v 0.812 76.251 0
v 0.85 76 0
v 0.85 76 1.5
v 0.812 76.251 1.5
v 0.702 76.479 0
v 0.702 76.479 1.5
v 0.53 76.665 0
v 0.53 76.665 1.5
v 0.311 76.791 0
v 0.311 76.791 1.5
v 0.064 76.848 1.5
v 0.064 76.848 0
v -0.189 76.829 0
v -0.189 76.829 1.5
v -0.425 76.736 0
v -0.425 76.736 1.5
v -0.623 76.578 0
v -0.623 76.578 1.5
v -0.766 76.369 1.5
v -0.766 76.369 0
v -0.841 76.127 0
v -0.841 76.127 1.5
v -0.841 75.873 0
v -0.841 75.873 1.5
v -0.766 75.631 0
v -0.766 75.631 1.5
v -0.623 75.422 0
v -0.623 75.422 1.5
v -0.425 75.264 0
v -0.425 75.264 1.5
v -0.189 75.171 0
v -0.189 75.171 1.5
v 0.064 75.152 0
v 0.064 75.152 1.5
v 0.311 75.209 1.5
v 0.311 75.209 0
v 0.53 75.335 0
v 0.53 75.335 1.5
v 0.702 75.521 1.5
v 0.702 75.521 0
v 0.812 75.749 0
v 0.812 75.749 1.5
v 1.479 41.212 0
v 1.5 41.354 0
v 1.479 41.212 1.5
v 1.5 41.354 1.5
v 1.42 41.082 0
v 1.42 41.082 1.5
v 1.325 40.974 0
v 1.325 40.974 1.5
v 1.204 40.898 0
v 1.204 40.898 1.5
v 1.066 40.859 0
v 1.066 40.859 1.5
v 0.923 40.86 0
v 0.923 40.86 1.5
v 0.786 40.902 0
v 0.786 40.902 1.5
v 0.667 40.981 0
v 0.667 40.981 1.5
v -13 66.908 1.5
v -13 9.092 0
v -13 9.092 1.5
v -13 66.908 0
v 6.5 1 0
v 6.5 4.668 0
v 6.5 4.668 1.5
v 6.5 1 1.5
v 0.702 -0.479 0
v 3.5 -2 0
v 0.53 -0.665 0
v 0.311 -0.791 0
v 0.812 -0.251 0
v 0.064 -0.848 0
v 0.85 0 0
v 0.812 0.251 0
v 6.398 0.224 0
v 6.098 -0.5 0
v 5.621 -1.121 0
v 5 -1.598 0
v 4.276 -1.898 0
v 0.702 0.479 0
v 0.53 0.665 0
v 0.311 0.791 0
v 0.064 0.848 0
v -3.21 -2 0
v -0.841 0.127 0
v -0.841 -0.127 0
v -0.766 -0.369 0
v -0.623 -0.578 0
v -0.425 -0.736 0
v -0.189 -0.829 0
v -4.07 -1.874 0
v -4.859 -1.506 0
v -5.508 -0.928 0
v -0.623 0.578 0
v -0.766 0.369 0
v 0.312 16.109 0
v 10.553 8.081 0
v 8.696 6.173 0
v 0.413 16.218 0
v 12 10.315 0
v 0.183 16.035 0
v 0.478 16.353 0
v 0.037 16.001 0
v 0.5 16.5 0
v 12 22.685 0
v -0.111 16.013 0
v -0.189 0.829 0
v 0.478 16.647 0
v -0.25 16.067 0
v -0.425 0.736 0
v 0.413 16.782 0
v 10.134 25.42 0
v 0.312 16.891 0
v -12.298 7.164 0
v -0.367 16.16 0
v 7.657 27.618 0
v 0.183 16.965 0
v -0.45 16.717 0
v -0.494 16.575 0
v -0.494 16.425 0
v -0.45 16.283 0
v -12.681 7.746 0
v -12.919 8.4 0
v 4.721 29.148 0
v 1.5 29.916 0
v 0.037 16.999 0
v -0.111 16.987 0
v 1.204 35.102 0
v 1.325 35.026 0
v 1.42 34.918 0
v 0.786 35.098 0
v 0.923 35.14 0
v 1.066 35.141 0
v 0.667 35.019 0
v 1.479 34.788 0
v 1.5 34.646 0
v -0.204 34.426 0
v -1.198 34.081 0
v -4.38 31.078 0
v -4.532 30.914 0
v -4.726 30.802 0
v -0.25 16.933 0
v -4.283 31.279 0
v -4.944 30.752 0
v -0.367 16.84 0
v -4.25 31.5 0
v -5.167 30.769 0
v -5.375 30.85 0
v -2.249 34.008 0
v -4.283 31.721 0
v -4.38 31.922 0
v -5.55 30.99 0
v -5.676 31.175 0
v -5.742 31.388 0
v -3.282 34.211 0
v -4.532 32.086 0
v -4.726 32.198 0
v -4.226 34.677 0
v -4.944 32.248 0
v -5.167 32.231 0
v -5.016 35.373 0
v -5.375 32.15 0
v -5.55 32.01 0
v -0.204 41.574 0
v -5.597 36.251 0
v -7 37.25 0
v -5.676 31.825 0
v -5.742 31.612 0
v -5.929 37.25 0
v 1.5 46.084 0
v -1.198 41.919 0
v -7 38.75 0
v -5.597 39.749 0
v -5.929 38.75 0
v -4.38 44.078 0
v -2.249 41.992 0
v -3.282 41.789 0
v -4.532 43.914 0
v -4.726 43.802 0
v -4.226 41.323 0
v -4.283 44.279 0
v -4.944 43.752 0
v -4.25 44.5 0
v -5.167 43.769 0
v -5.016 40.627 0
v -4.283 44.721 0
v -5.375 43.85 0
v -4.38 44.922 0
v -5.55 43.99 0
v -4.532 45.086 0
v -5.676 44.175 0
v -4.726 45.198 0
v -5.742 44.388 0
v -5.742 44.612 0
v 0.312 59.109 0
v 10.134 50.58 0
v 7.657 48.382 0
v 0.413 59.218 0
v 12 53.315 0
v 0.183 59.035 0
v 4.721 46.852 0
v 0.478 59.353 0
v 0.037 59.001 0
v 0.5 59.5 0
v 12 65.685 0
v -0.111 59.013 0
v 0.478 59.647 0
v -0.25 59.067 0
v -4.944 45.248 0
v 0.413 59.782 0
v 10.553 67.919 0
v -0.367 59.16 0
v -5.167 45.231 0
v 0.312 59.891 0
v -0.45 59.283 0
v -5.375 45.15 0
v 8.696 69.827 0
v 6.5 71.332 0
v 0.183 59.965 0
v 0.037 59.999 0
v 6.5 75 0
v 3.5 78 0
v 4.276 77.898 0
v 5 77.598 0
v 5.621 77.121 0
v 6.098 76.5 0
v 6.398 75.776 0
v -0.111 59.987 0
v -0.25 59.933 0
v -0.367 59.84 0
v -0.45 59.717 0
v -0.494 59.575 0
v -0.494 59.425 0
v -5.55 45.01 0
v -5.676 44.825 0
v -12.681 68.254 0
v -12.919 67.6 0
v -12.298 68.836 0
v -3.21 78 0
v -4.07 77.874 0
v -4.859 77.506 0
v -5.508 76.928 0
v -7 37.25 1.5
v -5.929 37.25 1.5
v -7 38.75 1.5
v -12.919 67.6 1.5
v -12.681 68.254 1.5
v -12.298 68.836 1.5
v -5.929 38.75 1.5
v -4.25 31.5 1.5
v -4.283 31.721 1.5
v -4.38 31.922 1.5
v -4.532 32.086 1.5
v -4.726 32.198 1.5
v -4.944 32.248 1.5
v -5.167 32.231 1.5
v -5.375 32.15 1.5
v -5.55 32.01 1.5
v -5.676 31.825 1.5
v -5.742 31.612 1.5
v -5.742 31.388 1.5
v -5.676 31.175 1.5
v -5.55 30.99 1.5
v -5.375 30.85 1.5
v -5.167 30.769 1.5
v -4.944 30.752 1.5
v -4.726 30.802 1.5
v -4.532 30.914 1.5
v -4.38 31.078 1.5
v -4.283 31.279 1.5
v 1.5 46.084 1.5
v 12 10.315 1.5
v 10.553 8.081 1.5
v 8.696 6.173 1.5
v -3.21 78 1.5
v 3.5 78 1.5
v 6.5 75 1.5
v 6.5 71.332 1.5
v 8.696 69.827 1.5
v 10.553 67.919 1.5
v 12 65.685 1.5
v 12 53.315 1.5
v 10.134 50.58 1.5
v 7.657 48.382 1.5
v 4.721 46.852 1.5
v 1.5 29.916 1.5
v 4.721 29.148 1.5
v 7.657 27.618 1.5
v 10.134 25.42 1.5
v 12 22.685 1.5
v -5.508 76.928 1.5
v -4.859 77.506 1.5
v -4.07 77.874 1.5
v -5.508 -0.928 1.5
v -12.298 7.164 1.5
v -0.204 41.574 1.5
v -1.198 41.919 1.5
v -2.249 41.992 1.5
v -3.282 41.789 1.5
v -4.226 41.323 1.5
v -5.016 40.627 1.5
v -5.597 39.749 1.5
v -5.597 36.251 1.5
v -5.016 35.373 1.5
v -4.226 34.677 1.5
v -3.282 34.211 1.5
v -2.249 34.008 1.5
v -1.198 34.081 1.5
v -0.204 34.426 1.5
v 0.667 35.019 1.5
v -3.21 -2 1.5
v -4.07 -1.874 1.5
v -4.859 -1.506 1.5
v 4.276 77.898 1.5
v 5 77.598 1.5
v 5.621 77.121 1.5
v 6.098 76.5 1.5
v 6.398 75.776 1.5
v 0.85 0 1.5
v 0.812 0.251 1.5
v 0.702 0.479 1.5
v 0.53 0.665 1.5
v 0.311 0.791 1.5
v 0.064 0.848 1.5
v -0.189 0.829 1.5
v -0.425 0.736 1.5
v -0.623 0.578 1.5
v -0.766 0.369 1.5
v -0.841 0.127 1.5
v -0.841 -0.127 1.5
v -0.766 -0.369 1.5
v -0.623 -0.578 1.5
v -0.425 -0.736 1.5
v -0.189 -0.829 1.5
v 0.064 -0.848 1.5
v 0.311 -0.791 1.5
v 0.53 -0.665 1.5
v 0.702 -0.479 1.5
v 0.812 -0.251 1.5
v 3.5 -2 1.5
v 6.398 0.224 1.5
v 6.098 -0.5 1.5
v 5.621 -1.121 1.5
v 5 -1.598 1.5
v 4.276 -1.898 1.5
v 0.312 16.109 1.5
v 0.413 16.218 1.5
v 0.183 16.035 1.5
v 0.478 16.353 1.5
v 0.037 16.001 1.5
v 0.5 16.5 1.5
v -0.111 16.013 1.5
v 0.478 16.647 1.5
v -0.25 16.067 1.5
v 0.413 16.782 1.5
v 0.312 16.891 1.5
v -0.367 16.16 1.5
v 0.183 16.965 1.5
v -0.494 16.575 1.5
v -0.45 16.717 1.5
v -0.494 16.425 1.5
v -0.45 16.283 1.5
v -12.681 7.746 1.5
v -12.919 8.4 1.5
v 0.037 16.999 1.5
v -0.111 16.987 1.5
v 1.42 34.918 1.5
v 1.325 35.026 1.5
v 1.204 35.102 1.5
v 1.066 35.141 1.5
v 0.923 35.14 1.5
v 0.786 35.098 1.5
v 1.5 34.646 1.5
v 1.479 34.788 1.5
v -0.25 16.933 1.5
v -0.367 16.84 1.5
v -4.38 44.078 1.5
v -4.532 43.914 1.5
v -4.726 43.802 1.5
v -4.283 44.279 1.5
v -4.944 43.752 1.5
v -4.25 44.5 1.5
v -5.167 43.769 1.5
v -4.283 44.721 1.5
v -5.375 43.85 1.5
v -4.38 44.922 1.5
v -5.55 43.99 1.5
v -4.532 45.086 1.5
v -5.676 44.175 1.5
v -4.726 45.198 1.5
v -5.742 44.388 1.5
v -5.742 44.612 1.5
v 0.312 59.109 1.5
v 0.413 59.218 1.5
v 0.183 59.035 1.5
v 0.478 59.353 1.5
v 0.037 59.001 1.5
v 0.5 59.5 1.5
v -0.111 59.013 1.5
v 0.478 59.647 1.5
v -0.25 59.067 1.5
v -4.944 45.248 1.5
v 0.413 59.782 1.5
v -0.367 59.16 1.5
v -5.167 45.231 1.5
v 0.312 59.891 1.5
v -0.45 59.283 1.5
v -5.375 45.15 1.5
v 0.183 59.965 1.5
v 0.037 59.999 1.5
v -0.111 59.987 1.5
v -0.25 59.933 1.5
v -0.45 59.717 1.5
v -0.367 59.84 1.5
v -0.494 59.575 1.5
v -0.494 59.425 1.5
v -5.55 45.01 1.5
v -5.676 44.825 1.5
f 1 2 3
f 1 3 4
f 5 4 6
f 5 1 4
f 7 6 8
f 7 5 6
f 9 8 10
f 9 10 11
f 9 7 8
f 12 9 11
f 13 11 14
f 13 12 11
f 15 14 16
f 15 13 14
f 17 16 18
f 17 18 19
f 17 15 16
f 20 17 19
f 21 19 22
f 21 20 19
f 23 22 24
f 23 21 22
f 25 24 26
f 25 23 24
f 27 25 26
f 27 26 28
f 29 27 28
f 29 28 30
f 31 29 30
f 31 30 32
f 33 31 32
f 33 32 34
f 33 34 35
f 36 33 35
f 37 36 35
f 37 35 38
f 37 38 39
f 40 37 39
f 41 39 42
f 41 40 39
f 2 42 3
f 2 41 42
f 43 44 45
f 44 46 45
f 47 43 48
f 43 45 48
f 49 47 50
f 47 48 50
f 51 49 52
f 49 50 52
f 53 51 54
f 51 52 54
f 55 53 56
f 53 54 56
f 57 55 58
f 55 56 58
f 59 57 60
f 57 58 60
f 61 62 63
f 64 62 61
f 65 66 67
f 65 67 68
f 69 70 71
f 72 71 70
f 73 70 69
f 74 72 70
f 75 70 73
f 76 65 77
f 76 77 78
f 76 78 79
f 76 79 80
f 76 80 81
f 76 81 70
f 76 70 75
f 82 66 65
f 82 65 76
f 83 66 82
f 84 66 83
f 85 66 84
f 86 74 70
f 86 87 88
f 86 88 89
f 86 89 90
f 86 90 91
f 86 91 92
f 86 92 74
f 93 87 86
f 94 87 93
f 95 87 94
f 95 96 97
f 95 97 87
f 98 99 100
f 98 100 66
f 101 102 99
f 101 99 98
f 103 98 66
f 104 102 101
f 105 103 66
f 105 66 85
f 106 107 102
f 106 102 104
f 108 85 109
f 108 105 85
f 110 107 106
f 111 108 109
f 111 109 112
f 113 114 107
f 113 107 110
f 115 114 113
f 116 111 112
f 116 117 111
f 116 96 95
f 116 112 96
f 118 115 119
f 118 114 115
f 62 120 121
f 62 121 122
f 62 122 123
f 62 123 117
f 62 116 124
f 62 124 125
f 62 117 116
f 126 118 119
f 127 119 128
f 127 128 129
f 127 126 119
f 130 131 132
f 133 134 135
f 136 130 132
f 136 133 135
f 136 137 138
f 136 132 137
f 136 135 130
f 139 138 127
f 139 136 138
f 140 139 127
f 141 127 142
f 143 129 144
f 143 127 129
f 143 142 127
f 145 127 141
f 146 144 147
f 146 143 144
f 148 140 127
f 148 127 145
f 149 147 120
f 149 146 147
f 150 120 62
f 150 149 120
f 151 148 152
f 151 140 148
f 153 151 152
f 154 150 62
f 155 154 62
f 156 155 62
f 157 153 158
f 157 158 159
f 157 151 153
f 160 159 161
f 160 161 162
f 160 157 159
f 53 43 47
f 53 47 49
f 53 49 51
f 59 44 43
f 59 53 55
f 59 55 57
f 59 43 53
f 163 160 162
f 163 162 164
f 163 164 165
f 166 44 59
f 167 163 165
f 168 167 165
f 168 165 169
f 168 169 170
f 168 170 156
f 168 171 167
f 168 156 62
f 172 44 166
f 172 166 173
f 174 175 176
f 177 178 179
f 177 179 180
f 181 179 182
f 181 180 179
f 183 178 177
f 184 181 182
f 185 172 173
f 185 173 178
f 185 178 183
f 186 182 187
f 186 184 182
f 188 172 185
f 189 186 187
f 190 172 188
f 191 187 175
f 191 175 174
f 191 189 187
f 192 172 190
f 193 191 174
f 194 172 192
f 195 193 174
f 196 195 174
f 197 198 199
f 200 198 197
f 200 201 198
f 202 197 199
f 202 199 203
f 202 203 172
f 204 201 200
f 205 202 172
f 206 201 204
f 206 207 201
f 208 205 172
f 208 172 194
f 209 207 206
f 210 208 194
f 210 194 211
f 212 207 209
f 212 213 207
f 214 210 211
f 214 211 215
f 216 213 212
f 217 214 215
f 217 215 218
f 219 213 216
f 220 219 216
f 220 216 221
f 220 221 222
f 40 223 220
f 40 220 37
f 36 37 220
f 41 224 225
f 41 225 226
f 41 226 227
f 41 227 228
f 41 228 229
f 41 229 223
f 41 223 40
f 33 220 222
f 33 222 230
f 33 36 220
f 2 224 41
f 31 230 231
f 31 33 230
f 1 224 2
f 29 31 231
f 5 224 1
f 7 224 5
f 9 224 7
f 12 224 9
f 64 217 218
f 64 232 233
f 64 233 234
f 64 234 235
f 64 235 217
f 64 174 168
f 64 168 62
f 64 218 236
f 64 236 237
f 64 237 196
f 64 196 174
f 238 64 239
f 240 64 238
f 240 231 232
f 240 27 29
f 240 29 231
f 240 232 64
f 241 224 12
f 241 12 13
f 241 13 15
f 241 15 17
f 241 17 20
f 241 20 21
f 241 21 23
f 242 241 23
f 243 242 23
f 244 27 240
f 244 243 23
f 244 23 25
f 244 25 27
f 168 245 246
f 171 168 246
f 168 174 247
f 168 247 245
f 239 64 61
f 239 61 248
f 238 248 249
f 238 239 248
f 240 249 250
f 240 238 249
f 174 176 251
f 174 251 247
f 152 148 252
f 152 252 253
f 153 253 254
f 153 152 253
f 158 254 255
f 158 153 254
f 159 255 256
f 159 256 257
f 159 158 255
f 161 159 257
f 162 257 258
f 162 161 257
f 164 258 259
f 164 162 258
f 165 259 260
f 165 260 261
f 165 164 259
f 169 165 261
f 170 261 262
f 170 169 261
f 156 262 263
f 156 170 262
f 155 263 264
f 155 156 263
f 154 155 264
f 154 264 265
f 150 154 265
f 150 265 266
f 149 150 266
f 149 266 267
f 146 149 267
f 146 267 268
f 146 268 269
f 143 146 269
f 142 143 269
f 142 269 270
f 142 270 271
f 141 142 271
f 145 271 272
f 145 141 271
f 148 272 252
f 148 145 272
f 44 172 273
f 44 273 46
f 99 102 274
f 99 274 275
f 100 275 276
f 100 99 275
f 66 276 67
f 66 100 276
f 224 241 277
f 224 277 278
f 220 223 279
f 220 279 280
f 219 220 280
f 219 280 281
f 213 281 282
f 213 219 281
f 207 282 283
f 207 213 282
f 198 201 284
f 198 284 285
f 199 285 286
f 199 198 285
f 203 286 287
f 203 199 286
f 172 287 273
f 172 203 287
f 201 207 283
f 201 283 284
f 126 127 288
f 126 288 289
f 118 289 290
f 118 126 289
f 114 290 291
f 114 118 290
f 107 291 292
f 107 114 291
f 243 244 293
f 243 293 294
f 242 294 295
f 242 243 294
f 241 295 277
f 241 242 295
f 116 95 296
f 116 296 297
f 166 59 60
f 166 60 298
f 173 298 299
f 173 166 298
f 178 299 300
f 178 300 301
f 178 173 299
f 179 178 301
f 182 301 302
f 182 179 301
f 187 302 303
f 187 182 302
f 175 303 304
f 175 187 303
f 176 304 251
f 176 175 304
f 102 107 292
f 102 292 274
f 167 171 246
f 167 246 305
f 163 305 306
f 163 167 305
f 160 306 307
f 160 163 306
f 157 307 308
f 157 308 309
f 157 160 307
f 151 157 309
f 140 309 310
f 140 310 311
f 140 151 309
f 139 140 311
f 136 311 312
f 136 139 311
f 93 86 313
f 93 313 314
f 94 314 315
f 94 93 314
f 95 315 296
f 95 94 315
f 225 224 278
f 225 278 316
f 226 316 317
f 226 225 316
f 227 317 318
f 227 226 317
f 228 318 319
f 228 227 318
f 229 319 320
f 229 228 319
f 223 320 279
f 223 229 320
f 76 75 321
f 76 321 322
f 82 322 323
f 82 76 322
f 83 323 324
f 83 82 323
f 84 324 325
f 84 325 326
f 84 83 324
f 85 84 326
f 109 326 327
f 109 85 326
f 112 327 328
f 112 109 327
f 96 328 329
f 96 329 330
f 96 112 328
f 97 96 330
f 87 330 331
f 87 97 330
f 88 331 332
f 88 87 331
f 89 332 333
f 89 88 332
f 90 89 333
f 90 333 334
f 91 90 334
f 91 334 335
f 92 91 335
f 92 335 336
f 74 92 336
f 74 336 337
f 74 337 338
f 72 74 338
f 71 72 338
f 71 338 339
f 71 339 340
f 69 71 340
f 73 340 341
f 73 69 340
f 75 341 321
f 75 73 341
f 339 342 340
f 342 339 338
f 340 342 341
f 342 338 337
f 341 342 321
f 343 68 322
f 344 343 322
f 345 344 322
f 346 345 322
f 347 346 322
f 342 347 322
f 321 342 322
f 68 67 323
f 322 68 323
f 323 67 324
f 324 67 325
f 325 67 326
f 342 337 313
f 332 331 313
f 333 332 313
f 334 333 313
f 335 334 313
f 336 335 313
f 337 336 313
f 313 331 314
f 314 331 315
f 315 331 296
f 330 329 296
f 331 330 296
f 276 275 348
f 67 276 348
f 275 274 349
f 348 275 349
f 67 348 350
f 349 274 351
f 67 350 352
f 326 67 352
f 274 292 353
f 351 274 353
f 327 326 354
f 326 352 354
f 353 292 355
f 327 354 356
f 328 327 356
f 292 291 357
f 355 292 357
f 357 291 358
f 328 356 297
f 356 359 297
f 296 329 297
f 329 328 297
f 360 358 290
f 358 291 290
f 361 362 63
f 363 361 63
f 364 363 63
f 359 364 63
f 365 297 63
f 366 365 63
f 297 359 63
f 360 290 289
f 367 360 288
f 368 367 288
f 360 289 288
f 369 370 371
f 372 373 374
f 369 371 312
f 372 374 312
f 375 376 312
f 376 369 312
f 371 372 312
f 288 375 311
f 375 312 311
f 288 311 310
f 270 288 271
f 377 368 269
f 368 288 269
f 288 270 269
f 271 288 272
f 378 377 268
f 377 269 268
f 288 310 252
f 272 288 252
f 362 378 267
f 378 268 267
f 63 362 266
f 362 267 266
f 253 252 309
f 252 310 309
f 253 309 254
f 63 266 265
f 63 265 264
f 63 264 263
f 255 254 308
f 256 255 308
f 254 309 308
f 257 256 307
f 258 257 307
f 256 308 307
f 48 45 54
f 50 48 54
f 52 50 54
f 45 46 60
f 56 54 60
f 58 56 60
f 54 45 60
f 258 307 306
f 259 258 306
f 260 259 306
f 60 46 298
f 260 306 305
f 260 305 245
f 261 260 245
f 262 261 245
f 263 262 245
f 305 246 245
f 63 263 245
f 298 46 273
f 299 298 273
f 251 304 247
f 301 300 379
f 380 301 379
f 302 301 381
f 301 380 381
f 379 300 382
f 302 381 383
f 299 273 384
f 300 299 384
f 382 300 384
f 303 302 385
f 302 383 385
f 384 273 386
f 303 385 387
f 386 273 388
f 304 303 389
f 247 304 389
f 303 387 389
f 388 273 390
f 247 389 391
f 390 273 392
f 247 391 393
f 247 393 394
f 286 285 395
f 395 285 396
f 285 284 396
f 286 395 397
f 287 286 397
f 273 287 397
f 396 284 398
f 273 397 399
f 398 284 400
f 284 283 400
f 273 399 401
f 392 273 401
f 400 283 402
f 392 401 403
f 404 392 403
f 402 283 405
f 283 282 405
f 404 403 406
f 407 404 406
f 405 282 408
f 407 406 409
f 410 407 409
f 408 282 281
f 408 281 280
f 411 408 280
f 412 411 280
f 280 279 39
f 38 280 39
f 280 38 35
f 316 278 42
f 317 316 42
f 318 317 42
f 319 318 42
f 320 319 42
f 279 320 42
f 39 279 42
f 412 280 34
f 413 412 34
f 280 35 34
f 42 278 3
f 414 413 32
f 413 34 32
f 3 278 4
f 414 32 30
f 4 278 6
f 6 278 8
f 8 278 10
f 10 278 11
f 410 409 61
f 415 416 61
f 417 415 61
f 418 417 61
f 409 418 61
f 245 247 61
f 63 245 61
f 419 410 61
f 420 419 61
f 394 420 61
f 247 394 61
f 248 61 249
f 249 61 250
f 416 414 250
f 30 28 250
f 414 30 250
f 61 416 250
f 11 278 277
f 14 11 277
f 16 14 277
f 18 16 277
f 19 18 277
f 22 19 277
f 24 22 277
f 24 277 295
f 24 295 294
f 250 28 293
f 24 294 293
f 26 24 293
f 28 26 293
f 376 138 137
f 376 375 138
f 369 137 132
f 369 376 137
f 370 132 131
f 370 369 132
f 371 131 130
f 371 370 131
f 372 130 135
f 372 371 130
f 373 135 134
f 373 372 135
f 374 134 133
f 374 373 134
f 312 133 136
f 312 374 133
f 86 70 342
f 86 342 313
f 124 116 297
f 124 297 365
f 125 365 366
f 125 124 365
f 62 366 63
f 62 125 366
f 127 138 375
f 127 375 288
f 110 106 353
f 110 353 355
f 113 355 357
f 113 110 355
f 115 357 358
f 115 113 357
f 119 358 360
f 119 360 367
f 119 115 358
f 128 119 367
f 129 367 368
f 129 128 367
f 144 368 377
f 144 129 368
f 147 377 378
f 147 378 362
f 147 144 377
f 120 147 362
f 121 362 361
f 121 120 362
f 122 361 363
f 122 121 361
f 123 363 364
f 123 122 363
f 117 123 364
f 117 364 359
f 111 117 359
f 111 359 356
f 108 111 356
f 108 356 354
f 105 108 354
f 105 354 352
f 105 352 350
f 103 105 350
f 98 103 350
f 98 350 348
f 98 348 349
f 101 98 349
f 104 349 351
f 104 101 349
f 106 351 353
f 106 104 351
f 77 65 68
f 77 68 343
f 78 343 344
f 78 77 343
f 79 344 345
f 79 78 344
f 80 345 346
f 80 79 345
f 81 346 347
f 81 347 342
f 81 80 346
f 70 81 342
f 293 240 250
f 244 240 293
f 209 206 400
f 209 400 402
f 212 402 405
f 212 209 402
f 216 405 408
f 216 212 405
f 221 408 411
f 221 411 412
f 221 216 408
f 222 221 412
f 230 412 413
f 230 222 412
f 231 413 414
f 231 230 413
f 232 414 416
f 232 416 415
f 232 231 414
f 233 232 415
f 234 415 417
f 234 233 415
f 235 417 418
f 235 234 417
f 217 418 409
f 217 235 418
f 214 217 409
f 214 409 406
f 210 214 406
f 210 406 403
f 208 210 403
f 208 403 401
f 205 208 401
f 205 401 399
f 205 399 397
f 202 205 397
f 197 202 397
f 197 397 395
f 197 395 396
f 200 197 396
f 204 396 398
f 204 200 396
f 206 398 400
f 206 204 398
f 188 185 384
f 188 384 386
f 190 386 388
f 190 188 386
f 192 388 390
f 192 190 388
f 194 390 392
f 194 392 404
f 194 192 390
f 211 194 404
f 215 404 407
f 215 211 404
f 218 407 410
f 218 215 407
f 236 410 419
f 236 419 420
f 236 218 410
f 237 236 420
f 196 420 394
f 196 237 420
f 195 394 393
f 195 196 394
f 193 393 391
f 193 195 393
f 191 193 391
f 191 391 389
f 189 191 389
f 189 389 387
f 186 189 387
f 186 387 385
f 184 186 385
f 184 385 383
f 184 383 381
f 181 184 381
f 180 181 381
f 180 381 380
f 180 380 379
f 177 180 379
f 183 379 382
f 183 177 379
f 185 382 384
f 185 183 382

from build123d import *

# Parameters (mm, degrees)
SKETCH_1_R      = 0.85
SKETCH_1_R_2    = 0.5
SKETCH_1_R_3    = 0.75
EXTRUDE_1_DEPTH = 1.5
FILLET_1_R      = 0.5


with BuildPart() as part:
    # Эскиз1 → Бобышка-Вытянуть1 (new body)
    with BuildSketch(Plane.XY):
        with BuildLine():
            Line((-13, 9.091910703), (-13, 66.908089297))
            ThreePointArc((-13, 66.908089297), (-12.819077862, 67.934149727), (-12.298133329, 68.836452126))
            Line((-12.298133329, 68.836452126), (-5.508214043, 76.928362829))
            ThreePointArc((-5.508214043, 76.928362829), (-4.477935499, 77.718923361), (-3.210080714, 78))
            Line((-3.210080714, 78), (3.5, 78))
            ThreePointArc((3.5, 78), (5.621320344, 77.121320344), (6.5, 75))
            Line((6.5, 75), (6.5, 71.332159566))
            ThreePointArc((6.5, 71.332159566), (9.671404616, 68.918807395), (12, 65.684658438))
            Line((12, 65.684658438), (12, 53.315341562))
            ThreePointArc((12, 53.315341562), (7.657483264, 48.381863913), (1.5, 46.083592135))
            Line((1.5, 46.083592135), (1.5, 39.936491673))
            ThreePointArc((1.5, 39.936491673), (-2.630843406, 41.949941341), (-5.929058411, 38.75))
            Line((-5.929058411, 38.75), (-7, 38.75))
            Line((-7, 38.75), (-7, 37.25))
            Line((-7, 37.25), (-5.929058411, 37.25))
            ThreePointArc((-5.929058411, 37.25), (-2.630843406, 34.050058659), (1.5, 36.063508327))
            Line((1.5, 36.063508327), (1.5, 29.916407865))
            ThreePointArc((1.5, 29.916407865), (7.657483264, 27.618136087), (12, 22.684658438))
            Line((12, 22.684658438), (12, 10.315341562))
            ThreePointArc((12, 10.315341562), (9.671404616, 7.081192605), (6.5, 4.667840434))
            Line((6.5, 4.667840434), (6.5, 1))
            ThreePointArc((6.5, 1), (5.621320344, -1.121320344), (3.5, -2))
            Line((3.5, -2), (-3.210080714, -2))
            ThreePointArc((-3.210080714, -2), (-4.477935499, -1.718923361), (-5.508214043, -0.928362829))
            Line((-5.508214043, -0.928362829), (-12.298133329, 7.163547874))
            ThreePointArc((-12.298133329, 7.163547874), (-12.819077862, 8.065850273), (-13, 9.091910703))
        make_face()
        Circle(SKETCH_1_R, mode=Mode.SUBTRACT)
        with Locations((0, 76)):
            Circle(SKETCH_1_R, mode=Mode.SUBTRACT)
        with Locations((0, 16.5)):
            Circle(SKETCH_1_R_2, mode=Mode.SUBTRACT)
        with Locations((0, 59.5)):
            Circle(SKETCH_1_R_2, mode=Mode.SUBTRACT)
        with Locations((-5, 44.5)):
            Circle(SKETCH_1_R_3, mode=Mode.SUBTRACT)
        with Locations((-5, 31.5)):
            Circle(SKETCH_1_R_3, mode=Mode.SUBTRACT)
    extrude(amount=EXTRUDE_1_DEPTH)

    # Скругление1
    fillet_1_edges = [part.edges().sort_by_distance(p)[0] for p in [
        (1.5, 36.063508327, 0.75),
        (1.5, 39.936491673, 0.75),
    ]]
    fillet(fillet_1_edges, radius=FILLET_1_R)


solid = part.part
